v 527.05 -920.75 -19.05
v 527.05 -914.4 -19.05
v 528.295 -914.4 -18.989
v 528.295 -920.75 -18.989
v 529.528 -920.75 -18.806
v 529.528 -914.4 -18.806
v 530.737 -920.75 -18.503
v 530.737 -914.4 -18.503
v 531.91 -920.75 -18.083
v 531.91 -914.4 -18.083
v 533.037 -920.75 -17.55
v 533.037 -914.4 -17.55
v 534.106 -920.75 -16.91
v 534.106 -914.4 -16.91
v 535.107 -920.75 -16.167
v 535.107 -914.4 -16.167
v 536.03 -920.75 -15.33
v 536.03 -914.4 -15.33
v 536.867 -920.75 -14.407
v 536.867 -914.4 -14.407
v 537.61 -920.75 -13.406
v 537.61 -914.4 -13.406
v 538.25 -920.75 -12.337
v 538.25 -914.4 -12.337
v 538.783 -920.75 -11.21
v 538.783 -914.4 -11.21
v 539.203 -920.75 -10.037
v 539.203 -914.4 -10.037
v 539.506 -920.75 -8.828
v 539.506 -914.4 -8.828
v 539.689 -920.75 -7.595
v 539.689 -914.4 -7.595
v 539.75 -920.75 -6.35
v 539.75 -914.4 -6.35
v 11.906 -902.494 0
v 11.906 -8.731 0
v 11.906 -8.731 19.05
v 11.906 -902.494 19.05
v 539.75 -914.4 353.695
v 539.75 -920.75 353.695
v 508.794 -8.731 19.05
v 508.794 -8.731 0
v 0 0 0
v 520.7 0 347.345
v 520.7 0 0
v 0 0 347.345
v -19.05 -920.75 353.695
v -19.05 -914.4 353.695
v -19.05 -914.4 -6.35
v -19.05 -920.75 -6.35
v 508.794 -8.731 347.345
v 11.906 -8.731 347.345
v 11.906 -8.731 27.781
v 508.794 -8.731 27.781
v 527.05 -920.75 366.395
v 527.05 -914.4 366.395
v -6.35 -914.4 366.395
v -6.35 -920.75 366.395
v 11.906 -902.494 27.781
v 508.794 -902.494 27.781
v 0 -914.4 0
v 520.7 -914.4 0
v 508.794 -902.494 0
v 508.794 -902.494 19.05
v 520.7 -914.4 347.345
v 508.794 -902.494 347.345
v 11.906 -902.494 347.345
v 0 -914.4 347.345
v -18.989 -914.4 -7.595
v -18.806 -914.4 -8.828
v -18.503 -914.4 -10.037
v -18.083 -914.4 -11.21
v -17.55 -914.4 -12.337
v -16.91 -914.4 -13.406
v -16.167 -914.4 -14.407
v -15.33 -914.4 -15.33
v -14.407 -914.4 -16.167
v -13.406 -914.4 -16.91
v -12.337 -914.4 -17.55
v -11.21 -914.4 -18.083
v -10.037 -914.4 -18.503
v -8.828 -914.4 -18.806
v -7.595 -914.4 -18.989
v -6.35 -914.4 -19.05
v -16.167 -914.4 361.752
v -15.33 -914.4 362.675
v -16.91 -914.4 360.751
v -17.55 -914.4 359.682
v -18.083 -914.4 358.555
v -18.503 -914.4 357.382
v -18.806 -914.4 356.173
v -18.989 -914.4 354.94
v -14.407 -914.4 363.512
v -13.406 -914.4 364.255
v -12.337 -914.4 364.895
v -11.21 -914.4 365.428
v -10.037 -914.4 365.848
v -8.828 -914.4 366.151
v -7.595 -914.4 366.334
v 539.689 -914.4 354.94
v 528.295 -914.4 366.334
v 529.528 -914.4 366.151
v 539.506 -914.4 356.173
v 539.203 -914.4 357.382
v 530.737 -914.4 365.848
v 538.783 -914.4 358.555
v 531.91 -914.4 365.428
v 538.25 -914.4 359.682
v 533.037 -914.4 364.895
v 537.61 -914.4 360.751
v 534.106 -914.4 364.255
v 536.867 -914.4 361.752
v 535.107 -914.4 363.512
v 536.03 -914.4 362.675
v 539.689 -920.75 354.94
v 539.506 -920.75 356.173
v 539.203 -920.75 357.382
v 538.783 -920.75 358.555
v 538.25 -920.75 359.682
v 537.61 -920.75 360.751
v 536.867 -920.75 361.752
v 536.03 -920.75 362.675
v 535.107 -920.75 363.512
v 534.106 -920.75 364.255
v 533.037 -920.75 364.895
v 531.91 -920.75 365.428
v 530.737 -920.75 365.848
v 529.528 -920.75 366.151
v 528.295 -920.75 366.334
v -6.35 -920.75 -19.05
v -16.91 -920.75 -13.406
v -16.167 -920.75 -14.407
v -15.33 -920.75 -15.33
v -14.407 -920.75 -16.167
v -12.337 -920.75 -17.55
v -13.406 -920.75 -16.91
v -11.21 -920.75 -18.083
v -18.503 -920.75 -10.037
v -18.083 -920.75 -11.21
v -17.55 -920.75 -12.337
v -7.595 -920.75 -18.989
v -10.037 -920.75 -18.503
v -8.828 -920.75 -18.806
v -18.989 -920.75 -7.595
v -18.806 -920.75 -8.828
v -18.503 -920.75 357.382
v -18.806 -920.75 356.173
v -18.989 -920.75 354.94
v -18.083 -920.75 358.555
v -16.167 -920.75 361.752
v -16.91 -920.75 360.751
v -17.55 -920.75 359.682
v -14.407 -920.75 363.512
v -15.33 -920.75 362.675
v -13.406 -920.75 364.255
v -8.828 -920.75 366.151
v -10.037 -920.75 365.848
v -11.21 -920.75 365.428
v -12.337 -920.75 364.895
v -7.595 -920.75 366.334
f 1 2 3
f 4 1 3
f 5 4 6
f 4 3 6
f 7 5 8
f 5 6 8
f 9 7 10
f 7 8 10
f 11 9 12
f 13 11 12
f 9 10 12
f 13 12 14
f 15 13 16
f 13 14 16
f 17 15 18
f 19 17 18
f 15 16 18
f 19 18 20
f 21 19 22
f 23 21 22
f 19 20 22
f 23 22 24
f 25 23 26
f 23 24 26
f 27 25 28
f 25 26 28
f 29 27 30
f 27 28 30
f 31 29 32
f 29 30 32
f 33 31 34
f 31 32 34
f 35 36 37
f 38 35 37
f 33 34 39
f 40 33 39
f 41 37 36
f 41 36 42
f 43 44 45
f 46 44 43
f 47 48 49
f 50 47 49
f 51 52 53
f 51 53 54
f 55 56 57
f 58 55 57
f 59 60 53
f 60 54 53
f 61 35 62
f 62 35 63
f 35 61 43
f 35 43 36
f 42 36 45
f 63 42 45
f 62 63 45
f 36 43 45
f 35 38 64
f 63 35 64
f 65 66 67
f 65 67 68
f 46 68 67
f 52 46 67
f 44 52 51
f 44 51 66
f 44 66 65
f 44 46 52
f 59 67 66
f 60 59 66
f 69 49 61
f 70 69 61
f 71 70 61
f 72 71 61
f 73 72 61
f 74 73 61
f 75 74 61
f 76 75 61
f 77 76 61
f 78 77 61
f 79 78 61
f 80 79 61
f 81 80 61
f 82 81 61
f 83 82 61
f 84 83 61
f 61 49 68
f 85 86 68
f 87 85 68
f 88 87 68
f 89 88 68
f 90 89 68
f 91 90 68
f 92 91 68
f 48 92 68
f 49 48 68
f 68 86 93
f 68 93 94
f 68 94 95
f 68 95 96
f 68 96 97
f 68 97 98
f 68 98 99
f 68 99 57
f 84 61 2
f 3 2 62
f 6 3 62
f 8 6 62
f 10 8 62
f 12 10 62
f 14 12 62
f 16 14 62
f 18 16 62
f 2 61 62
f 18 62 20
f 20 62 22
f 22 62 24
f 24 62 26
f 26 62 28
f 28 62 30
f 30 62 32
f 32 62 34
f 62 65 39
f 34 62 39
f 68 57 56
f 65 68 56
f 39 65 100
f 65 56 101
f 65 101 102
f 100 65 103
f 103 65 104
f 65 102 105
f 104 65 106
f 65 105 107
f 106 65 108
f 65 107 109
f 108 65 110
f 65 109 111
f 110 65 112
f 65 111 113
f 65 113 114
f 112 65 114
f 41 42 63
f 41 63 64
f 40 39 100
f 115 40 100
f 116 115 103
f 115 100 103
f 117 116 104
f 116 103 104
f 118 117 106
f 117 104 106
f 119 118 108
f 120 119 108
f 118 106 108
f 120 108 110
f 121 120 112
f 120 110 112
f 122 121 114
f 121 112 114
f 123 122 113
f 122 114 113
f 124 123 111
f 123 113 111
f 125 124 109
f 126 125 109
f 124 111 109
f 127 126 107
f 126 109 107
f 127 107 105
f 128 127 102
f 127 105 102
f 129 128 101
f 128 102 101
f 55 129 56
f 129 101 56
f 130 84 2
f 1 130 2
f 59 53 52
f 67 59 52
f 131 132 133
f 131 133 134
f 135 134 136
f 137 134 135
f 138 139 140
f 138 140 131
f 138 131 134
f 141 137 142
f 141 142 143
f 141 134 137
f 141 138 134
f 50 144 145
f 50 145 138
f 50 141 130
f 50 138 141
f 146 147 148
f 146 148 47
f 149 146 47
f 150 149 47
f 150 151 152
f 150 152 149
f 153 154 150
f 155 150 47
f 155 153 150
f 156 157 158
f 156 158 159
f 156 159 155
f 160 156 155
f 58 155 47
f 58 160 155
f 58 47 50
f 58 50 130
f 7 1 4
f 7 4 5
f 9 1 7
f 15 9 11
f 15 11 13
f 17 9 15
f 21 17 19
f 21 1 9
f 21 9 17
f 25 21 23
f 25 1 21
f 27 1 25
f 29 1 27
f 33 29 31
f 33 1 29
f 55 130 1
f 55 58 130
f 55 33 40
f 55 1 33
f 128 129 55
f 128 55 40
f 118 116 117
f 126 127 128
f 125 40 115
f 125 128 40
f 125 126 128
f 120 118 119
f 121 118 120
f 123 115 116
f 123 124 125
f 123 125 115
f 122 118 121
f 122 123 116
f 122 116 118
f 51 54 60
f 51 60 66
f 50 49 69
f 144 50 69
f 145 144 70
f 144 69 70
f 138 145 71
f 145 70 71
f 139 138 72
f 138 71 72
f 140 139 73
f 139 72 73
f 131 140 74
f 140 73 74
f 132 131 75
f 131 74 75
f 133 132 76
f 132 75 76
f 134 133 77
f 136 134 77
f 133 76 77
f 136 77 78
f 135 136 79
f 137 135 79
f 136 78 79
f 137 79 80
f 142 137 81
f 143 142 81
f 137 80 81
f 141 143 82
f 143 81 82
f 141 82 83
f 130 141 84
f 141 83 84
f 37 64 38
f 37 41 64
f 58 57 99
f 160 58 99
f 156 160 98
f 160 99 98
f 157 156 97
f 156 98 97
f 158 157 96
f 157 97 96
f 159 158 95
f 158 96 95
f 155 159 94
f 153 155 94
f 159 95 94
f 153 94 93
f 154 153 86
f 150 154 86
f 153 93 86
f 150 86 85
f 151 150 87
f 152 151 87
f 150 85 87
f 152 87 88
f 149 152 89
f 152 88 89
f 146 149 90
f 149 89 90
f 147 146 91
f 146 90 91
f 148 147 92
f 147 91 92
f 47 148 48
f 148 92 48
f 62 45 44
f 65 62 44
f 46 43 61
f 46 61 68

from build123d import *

# Parameters (mm, degrees)
F0_W     = 520.7
F0_H     = 347.345
F1_DEPTH = 914.4
F2_T     = -11.90625
F4_DEPTH = 6.35
F5_W     = 496.8875
F5_H     = 3.175
F6_DEPTH = 366.396
F7_W     = 503.2375
F7_H     = 8.73125
F8_DEPTH = 914.4


with BuildPart() as f1:
    # F0 (on Front) → F1 (new body)
    with BuildSketch(Plane.XZ):
        with Locations((260.35, 173.6725)):
            Rectangle(F0_W, F0_H)
    extrude(amount=F1_DEPTH)

    # F2
    f2_openings = [f1.faces().sort_by_distance(p)[0] for p in [
        (260.35, -457.2, 347.345),
        (260.35, -457.2, 0),
    ]]
    offset(amount=F2_T, openings=f2_openings)

    # F3 (on face) → F4 (join)
    with BuildSketch(Plane.XZ.offset(914.4)):
        with BuildLine():
            ThreePointArc((-19.05, -6.35), (-15.330256, -15.330256), (-6.35, -19.05))
            Line((-6.35, -19.05), (527.05, -19.05))
            ThreePointArc((527.05, -19.05), (536.030256, -15.330256), (539.75, -6.35))
            Line((539.75, -6.35), (539.75, 353.695))
            ThreePointArc((539.75, 353.695), (536.030256, 362.675256), (527.05, 366.395))
            Line((527.05, 366.395), (-6.35, 366.395))
            ThreePointArc((-6.35, 366.395), (-15.330256, 362.675256), (-19.05, 353.695))
            Line((-19.05, 353.695), (-19.05, -6.35))
        make_face()
    extrude(amount=F4_DEPTH)

    # F5 (on face) → F6 (cut, through all)
    with BuildSketch(Plane.XY.offset(347.345)):
        with Locations((260.35, -10.31875)):
            Rectangle(F5_W, F5_H)
    extrude(amount=-F6_DEPTH, mode=Mode.SUBTRACT)

    # F7 (on face) → F8 (join, through all)
    with BuildSketch(Plane(origin=(0, 0, 0), x_dir=(-1, 0, 0), z_dir=(0, 1, 0))):
        with Locations((-260.35, 23.415625)):
            Rectangle(F7_W, F7_H)
    extrude(amount=-F8_DEPTH)


solid = f1.part
